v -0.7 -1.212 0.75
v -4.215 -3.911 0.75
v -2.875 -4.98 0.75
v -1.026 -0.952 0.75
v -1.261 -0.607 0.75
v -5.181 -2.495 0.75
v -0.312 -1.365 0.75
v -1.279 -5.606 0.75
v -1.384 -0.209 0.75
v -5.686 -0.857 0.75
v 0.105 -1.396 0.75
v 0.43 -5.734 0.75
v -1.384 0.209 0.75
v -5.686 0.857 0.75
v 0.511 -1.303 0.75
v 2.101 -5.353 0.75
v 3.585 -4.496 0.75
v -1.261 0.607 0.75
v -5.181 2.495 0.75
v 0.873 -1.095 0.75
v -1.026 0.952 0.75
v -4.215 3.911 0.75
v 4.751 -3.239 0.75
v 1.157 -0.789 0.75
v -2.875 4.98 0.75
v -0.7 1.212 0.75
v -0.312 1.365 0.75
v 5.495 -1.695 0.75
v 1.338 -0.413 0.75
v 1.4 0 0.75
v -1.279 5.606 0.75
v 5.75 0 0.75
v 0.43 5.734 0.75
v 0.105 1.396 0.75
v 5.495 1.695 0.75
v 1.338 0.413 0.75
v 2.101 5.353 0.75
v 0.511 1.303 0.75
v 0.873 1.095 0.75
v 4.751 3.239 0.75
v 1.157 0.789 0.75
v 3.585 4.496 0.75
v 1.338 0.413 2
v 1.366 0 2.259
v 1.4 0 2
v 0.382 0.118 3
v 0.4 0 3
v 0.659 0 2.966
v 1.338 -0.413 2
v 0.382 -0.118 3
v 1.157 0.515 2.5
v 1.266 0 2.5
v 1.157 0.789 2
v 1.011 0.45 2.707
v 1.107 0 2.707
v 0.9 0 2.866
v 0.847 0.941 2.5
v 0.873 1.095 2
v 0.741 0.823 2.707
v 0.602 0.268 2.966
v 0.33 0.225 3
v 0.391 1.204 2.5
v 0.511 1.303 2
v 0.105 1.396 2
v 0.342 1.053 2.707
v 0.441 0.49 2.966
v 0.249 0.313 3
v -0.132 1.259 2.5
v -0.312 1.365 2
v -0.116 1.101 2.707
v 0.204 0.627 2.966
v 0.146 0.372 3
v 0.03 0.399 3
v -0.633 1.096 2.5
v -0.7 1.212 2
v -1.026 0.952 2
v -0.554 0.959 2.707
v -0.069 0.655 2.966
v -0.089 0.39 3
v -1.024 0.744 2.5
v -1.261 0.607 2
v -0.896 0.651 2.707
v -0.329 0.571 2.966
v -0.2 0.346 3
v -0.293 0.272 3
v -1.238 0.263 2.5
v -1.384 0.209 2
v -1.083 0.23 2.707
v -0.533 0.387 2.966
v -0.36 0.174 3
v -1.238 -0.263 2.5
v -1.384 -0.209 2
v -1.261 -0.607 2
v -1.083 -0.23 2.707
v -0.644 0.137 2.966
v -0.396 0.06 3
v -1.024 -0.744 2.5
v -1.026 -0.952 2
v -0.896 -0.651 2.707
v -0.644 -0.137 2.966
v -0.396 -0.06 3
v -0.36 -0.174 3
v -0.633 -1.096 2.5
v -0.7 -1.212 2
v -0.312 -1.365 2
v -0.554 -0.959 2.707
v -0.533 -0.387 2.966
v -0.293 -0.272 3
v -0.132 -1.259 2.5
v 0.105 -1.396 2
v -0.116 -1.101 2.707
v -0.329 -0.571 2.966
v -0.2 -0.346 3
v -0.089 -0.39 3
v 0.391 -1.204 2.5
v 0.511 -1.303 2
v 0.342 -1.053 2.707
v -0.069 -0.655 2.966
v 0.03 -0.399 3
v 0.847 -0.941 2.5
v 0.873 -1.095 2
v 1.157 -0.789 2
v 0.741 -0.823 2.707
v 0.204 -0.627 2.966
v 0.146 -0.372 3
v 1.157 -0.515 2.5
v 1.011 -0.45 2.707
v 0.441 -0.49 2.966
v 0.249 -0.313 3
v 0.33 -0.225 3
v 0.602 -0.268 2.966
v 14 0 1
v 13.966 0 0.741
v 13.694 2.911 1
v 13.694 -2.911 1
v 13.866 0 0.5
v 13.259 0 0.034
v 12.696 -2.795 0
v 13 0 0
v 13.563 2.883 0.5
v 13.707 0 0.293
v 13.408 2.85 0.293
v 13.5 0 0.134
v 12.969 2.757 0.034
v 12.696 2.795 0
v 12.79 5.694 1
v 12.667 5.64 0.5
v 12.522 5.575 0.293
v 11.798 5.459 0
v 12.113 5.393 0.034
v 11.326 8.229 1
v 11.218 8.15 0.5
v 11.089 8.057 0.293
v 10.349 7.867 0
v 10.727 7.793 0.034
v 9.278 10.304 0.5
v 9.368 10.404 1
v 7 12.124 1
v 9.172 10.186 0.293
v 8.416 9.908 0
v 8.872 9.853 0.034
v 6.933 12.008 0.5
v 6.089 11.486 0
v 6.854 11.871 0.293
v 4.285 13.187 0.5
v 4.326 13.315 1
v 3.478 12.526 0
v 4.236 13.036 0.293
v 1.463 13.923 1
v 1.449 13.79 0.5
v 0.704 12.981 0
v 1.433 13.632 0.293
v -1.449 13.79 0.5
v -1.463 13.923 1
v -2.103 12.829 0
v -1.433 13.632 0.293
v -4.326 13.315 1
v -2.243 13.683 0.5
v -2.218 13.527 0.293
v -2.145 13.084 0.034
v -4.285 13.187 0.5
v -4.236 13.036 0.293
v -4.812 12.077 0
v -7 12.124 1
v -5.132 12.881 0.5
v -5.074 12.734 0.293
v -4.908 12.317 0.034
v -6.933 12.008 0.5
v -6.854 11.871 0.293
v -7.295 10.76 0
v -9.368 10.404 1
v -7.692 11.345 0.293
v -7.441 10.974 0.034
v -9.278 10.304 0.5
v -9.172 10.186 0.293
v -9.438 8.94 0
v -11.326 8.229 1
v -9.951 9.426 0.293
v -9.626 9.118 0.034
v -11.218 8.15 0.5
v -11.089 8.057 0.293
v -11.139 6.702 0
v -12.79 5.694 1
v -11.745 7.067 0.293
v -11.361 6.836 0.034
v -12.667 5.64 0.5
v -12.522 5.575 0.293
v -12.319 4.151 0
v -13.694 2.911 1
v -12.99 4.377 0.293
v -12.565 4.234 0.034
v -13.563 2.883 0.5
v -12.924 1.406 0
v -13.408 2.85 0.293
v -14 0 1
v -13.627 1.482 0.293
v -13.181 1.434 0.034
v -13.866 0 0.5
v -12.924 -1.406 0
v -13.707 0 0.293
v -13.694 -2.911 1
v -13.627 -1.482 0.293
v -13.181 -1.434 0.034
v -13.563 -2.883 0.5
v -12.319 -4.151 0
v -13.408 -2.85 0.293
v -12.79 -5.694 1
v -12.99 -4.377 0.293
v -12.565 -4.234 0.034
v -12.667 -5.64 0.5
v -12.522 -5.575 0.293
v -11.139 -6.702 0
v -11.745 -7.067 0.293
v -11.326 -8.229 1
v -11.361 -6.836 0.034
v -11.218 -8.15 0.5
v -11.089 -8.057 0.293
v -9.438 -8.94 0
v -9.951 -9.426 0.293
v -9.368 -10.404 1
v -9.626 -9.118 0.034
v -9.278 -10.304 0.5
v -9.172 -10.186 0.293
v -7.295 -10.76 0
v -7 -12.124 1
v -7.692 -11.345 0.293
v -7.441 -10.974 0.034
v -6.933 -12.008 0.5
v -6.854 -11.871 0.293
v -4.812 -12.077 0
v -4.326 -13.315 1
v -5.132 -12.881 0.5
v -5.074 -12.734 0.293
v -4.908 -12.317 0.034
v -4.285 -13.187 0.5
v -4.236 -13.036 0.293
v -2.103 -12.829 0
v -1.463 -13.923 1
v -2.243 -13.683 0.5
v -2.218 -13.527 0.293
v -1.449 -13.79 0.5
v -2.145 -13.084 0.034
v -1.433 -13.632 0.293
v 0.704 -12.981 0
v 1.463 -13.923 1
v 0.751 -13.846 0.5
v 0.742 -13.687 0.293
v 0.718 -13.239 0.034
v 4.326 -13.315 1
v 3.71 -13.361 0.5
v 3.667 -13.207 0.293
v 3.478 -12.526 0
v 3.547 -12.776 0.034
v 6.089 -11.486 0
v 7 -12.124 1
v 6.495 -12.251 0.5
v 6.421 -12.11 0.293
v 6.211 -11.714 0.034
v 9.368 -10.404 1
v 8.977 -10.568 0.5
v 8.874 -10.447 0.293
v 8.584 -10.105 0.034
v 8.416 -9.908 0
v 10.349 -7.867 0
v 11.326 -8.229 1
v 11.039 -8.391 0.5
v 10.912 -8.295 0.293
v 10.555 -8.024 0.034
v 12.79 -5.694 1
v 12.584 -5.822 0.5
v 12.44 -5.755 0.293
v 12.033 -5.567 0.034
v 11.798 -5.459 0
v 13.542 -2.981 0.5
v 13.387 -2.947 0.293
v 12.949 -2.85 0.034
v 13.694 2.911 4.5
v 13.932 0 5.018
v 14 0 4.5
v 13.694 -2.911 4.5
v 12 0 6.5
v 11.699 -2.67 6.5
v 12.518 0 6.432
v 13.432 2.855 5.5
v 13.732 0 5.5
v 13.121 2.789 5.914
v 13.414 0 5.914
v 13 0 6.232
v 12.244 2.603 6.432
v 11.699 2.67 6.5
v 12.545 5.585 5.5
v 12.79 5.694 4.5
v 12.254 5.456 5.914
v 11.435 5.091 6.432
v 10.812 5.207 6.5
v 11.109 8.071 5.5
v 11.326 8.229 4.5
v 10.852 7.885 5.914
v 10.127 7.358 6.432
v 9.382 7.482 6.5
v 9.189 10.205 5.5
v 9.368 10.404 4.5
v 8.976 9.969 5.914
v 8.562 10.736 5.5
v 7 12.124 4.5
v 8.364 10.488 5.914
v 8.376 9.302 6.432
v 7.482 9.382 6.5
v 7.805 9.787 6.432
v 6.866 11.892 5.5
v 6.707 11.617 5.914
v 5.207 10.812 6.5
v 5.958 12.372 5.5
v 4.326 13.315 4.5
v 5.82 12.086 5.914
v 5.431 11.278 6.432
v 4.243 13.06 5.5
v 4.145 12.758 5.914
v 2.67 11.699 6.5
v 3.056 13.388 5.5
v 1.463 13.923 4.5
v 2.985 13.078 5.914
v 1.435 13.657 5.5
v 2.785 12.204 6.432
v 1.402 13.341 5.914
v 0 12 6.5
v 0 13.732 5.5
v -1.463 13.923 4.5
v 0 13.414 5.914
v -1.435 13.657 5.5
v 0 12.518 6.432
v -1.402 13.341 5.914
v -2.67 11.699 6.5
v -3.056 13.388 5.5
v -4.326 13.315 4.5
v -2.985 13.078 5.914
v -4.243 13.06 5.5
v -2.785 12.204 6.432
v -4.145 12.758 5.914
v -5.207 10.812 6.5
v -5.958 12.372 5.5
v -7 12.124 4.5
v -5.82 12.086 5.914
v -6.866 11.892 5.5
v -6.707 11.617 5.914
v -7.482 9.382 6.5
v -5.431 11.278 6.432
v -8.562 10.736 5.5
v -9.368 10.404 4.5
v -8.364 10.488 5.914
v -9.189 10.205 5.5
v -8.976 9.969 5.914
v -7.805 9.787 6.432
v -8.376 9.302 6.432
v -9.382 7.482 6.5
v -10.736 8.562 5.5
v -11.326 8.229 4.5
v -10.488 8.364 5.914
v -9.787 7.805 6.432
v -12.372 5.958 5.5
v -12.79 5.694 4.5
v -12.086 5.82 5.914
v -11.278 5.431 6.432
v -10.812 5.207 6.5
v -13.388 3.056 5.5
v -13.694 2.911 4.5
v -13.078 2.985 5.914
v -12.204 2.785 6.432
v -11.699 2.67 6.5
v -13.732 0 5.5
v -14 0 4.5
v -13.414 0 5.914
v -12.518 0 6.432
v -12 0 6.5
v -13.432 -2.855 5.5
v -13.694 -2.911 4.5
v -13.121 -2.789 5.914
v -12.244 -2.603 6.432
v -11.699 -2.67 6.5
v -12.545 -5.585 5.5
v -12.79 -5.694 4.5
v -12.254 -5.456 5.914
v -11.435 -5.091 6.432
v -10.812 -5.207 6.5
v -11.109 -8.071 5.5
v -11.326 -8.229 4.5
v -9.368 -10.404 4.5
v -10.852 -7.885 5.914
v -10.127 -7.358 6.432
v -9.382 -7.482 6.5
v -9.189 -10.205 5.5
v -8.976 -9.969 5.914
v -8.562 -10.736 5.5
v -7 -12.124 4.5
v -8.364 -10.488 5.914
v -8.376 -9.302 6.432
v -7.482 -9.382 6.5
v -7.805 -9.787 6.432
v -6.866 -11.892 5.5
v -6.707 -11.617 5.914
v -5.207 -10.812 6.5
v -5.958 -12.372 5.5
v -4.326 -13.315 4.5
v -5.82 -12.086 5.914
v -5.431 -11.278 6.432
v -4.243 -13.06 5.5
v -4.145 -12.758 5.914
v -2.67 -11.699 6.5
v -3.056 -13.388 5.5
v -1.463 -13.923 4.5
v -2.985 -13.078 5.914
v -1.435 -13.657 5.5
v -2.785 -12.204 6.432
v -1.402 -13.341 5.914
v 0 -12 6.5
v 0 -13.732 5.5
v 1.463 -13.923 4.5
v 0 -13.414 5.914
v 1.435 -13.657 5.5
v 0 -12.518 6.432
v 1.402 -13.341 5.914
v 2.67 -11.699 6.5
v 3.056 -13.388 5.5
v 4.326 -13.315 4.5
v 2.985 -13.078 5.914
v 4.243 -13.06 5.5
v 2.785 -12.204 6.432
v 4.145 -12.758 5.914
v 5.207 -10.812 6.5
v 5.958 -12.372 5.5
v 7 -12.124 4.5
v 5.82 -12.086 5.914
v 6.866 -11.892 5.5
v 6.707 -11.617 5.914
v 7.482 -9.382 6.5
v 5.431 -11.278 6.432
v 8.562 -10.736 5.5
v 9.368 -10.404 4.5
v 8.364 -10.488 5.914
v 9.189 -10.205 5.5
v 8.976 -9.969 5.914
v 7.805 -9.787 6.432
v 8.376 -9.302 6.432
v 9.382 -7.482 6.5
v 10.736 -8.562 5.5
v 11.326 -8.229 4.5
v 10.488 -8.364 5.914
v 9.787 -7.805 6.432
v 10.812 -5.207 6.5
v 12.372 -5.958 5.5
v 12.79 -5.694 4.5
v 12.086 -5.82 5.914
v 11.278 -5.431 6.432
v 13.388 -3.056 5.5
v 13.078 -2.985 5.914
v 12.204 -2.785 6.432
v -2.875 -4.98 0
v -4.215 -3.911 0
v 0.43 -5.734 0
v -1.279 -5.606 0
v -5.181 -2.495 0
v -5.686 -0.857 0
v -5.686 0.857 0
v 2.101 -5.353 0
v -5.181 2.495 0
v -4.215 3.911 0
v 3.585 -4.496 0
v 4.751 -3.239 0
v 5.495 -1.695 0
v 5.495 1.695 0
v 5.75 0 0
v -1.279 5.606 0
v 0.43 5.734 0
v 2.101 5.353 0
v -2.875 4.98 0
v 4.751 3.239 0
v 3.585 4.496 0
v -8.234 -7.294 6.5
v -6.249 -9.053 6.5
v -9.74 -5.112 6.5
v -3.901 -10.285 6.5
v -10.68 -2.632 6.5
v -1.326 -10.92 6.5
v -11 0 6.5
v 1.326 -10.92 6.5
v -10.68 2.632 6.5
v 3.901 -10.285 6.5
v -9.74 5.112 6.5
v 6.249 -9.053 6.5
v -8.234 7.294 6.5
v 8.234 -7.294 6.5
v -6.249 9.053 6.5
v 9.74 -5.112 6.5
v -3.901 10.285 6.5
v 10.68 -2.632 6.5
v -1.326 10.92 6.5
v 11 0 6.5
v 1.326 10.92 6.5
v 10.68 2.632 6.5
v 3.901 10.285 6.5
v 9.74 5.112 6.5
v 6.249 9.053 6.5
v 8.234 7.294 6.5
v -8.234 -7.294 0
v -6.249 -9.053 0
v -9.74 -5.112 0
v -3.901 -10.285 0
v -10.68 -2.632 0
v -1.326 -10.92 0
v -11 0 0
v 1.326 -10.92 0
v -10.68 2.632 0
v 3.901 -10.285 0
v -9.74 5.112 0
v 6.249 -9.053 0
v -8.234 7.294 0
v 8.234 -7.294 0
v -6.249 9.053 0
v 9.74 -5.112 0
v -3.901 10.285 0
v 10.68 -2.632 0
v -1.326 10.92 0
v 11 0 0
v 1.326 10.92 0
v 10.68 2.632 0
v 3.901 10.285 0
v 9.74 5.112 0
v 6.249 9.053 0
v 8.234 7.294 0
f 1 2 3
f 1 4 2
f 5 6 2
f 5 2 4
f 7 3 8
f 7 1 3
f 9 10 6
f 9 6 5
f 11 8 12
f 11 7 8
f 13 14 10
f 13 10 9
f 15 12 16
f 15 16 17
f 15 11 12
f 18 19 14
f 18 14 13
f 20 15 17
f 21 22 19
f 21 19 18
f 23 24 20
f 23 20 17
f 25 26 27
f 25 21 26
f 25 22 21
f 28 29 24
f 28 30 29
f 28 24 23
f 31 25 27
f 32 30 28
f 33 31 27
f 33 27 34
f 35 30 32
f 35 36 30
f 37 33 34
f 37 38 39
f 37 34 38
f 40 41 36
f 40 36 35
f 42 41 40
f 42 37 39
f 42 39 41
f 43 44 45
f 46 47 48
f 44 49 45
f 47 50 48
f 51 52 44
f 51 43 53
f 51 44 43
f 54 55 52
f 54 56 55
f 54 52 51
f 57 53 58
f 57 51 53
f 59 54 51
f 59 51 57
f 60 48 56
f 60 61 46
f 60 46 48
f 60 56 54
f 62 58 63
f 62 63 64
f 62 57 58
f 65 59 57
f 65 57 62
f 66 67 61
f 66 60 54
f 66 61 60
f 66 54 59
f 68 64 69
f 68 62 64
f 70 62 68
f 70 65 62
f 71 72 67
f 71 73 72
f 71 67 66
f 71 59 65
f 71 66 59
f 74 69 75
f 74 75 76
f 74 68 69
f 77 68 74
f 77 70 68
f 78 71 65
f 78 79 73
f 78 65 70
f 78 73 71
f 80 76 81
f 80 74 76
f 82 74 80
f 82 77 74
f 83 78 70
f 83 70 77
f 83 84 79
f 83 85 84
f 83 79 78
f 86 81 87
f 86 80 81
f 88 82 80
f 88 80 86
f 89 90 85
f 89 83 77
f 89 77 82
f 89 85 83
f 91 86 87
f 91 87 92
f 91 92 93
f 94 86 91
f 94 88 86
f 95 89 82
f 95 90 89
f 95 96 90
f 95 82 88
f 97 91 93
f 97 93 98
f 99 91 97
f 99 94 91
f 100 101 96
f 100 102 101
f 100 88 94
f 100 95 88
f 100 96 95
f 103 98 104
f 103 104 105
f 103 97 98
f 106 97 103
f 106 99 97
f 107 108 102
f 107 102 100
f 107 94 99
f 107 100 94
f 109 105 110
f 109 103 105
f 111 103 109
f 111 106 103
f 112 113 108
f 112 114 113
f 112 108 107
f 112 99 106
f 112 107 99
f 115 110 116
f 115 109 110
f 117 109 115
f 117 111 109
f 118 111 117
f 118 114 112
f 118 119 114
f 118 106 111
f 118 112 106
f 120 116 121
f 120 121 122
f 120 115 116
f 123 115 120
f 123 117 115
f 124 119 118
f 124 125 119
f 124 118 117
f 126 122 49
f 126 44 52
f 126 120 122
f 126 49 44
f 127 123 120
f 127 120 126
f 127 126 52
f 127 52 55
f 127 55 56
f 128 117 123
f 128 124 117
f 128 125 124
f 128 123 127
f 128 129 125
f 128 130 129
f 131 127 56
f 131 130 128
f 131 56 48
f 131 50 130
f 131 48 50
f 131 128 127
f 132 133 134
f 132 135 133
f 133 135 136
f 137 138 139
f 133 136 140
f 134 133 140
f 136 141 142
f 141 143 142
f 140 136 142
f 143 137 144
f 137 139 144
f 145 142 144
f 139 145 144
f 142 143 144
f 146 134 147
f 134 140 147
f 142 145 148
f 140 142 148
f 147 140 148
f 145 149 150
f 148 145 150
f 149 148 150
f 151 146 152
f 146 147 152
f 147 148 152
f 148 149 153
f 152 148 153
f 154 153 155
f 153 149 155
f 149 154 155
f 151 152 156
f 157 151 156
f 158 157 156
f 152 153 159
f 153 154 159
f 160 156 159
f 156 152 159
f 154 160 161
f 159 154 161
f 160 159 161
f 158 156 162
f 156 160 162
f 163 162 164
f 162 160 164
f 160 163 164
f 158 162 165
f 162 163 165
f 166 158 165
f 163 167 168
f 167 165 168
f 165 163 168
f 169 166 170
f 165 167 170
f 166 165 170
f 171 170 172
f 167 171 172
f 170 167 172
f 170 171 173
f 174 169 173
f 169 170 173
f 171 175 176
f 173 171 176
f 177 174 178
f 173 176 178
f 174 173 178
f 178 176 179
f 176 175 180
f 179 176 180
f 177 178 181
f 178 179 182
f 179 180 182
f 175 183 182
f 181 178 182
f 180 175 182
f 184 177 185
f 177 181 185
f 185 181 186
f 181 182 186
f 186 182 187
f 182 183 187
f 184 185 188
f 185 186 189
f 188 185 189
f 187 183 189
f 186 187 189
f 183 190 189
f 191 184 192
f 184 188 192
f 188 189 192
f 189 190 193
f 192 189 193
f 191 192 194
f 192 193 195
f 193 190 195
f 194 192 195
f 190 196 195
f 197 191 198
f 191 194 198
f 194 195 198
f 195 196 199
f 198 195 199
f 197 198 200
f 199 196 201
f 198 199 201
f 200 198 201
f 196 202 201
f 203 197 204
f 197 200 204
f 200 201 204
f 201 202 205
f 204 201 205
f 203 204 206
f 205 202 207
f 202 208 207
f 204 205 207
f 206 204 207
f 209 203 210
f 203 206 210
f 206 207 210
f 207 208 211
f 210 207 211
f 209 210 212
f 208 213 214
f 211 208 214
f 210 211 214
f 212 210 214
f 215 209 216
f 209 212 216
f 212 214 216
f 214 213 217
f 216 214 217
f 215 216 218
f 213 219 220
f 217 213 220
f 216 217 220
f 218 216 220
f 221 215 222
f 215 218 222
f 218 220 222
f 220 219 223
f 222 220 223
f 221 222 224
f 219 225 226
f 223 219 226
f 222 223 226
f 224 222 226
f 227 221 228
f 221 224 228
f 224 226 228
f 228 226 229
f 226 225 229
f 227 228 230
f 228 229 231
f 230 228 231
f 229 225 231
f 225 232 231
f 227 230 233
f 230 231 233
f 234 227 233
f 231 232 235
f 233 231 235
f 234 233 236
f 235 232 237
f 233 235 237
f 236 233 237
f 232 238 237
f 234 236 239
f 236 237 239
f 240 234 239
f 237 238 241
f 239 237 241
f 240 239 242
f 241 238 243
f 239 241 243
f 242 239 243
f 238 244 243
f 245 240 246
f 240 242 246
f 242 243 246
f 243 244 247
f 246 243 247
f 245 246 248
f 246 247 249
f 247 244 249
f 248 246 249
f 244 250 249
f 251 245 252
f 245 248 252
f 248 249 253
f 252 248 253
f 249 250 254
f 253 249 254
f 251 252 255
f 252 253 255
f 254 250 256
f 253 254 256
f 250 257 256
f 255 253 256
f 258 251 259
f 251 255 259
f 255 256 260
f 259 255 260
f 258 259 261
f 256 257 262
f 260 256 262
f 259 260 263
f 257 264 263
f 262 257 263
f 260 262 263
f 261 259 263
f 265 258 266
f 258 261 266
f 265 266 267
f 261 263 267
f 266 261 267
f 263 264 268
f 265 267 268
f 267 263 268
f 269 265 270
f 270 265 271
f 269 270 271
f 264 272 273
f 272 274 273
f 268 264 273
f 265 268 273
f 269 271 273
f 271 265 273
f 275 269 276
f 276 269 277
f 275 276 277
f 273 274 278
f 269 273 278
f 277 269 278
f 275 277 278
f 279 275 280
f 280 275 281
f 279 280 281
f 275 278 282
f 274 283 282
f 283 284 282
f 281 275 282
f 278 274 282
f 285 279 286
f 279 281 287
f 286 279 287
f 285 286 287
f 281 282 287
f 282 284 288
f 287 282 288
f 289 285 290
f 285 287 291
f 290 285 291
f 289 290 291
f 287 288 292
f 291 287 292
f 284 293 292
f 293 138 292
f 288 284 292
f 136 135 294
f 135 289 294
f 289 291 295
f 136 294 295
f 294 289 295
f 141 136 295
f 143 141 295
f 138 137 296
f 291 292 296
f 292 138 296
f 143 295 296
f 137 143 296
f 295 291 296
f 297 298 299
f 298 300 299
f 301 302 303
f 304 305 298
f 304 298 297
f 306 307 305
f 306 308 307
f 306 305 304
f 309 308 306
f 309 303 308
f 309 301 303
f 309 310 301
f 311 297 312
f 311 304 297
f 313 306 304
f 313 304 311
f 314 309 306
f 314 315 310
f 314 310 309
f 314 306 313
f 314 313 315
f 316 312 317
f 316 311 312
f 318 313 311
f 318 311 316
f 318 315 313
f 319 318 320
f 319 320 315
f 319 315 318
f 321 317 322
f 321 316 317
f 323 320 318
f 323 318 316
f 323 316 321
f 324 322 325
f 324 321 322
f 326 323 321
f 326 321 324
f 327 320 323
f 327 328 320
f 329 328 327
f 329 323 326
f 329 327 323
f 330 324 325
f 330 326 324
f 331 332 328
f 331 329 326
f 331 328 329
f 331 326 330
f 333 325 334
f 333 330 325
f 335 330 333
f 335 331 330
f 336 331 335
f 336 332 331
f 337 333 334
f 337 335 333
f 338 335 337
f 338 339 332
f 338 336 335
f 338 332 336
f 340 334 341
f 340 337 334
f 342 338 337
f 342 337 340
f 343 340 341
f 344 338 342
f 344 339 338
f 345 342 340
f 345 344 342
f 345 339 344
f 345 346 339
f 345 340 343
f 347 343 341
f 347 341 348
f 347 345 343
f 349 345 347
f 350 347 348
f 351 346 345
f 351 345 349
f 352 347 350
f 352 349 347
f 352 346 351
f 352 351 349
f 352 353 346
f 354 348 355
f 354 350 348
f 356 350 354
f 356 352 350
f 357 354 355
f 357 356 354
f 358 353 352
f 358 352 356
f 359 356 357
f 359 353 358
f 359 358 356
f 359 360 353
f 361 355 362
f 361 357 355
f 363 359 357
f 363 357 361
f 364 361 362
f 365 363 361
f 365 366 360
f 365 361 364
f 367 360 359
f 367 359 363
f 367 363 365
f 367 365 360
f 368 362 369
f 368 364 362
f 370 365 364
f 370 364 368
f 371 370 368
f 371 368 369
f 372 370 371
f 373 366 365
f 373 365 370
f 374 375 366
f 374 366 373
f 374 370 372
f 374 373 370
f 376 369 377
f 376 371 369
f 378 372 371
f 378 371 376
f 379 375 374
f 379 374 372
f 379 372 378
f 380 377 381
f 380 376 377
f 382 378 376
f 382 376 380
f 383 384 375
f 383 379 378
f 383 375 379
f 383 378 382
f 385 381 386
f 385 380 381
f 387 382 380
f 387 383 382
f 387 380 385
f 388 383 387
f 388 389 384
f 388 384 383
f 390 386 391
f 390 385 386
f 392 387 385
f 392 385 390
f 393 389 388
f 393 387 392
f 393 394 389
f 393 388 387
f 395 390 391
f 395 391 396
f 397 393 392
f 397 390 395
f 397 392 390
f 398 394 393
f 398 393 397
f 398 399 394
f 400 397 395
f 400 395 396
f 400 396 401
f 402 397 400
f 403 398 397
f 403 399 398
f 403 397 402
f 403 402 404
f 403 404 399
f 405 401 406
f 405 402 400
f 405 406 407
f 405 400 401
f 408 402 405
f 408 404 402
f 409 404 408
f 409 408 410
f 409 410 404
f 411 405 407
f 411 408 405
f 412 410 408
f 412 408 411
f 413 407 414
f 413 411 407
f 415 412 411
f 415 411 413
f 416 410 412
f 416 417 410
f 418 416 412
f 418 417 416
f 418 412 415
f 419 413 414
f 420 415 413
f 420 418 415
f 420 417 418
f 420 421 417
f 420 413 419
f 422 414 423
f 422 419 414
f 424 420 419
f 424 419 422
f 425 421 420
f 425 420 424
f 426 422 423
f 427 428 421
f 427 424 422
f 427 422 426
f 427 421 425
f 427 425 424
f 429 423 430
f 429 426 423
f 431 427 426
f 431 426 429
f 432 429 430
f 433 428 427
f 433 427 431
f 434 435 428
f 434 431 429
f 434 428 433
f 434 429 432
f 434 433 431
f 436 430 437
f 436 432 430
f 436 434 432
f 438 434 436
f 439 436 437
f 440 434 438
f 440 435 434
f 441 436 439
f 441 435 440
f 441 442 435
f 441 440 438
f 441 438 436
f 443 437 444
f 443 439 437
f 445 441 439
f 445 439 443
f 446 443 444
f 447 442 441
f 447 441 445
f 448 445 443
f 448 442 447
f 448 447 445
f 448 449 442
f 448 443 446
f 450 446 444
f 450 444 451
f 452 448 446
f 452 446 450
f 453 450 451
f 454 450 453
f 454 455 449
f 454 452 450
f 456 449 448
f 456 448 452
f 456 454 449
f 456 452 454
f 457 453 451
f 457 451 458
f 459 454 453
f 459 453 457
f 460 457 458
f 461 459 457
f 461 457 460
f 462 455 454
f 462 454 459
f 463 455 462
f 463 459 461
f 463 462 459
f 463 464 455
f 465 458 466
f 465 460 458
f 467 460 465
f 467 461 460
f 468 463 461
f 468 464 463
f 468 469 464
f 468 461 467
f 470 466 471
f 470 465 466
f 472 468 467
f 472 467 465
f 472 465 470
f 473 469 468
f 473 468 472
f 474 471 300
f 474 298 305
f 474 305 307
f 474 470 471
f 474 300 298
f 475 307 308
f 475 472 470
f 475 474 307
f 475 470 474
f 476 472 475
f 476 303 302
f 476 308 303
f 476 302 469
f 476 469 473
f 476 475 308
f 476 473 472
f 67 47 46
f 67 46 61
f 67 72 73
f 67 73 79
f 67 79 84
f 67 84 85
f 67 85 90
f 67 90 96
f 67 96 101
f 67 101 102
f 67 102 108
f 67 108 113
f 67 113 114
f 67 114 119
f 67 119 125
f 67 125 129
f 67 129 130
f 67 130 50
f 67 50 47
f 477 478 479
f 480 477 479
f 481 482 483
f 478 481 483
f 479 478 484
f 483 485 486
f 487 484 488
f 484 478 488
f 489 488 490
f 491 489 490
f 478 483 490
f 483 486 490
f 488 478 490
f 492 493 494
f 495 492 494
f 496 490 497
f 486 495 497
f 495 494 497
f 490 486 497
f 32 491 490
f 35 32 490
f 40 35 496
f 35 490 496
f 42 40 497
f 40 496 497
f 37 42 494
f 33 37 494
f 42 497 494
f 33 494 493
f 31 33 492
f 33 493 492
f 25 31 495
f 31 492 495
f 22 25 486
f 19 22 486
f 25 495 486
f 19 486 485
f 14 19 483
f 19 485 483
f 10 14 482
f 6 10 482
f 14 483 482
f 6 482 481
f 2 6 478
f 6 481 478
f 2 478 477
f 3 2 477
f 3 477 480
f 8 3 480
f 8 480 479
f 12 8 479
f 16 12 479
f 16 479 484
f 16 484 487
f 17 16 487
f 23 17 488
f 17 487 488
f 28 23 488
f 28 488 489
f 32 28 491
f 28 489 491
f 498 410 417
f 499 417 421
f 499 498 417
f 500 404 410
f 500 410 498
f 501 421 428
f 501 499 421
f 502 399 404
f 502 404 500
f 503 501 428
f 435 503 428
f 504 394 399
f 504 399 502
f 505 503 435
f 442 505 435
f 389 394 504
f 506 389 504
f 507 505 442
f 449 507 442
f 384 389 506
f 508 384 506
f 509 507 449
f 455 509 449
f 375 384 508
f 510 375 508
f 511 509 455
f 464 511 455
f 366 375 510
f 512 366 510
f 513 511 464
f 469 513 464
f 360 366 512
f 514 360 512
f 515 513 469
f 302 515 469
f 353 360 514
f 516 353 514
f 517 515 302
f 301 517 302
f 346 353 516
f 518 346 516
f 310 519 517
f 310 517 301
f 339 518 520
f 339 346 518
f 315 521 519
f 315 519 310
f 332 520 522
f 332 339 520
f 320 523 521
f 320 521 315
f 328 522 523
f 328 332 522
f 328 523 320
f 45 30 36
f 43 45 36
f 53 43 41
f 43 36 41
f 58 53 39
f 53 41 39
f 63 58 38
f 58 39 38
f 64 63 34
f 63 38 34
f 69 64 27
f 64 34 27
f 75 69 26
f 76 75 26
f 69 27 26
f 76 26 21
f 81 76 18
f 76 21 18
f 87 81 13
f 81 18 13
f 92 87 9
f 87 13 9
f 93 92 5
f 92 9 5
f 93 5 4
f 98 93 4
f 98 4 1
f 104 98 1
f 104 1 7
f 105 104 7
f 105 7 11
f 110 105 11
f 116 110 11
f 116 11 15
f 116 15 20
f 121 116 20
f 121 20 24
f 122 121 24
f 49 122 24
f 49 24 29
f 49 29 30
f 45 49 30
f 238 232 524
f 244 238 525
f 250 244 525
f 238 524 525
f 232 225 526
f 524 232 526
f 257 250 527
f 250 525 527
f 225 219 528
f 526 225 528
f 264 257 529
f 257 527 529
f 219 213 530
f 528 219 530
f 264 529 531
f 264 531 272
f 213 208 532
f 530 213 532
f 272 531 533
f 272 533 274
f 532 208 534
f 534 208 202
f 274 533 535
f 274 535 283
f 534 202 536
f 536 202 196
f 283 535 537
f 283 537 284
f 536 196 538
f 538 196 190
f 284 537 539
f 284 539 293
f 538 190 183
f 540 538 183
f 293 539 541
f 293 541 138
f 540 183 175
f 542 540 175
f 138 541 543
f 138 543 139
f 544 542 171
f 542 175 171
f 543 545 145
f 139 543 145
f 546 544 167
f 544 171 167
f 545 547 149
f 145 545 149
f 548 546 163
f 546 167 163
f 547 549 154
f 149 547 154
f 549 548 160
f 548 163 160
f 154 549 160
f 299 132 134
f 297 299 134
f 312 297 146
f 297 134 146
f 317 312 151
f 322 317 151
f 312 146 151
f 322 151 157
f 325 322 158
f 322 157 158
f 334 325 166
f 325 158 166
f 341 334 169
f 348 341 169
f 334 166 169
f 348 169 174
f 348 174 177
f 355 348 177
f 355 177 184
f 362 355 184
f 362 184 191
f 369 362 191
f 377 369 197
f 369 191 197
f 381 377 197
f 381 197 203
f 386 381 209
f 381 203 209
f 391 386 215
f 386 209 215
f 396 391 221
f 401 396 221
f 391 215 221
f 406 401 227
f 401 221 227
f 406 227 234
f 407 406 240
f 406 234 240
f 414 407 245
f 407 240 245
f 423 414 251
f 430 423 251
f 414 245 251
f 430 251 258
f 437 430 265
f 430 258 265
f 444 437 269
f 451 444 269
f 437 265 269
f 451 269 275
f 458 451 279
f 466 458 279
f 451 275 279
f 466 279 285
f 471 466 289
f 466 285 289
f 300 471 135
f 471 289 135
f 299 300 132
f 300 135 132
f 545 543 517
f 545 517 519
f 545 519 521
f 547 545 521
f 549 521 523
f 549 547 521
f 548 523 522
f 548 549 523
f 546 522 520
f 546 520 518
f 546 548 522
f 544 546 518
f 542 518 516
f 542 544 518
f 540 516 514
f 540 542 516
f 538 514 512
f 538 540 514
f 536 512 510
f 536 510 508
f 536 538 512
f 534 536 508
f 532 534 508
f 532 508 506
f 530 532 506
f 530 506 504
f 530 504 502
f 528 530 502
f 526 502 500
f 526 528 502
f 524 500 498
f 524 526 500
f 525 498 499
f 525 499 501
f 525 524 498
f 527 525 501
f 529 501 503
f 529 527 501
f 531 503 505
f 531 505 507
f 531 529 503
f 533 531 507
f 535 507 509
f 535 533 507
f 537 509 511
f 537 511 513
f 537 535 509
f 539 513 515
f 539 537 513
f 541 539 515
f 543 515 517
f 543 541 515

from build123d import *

# Parameters (mm, degrees)
F0_R     = 14
F0_R_2   = 11
F1_DEPTH = 6.5
F2_R     = 2
F3_R     = 1
F4_R     = 5.75
F4_R_2   = 1.4
F5_DEPTH = 0.75
F6_DEPTH = 3
F7_R     = 1


with BuildPart() as f1:
    # F0 (on Top) → F1 (new body)
    with BuildSketch(Plane.XY):
        Circle(F0_R)
        Circle(F0_R_2, mode=Mode.SUBTRACT)
    extrude(amount=F1_DEPTH)

    # F2
    f2_edges = [f1.edges().sort_by_distance(p)[0] for p in [
        (-14, 0, 6.5),
    ]]
    fillet(f2_edges, radius=F2_R)

    # F3
    f3_edges = [f1.edges().sort_by_distance(p)[0] for p in [
        (-14, 0, 0),
    ]]
    fillet(f3_edges, radius=F3_R)


with BuildPart() as f5:
    # F4 (on Top) → F5 (new body)
    with BuildSketch(Plane.XY):
        Circle(F4_R)
        Circle(F4_R_2, mode=Mode.SUBTRACT)
    extrude(amount=F5_DEPTH)

    # F4 (on Top) → F6 (join)
    with BuildSketch(Plane.XY):
        Circle(F4_R_2)
    extrude(amount=F6_DEPTH)

    # F7
    f7_edges = [f5.edges().sort_by_distance(p)[0] for p in [
        (-1.4, 0, 3),
    ]]
    fillet(f7_edges, radius=F7_R)


solid = Compound([f1.part, f5.part])
